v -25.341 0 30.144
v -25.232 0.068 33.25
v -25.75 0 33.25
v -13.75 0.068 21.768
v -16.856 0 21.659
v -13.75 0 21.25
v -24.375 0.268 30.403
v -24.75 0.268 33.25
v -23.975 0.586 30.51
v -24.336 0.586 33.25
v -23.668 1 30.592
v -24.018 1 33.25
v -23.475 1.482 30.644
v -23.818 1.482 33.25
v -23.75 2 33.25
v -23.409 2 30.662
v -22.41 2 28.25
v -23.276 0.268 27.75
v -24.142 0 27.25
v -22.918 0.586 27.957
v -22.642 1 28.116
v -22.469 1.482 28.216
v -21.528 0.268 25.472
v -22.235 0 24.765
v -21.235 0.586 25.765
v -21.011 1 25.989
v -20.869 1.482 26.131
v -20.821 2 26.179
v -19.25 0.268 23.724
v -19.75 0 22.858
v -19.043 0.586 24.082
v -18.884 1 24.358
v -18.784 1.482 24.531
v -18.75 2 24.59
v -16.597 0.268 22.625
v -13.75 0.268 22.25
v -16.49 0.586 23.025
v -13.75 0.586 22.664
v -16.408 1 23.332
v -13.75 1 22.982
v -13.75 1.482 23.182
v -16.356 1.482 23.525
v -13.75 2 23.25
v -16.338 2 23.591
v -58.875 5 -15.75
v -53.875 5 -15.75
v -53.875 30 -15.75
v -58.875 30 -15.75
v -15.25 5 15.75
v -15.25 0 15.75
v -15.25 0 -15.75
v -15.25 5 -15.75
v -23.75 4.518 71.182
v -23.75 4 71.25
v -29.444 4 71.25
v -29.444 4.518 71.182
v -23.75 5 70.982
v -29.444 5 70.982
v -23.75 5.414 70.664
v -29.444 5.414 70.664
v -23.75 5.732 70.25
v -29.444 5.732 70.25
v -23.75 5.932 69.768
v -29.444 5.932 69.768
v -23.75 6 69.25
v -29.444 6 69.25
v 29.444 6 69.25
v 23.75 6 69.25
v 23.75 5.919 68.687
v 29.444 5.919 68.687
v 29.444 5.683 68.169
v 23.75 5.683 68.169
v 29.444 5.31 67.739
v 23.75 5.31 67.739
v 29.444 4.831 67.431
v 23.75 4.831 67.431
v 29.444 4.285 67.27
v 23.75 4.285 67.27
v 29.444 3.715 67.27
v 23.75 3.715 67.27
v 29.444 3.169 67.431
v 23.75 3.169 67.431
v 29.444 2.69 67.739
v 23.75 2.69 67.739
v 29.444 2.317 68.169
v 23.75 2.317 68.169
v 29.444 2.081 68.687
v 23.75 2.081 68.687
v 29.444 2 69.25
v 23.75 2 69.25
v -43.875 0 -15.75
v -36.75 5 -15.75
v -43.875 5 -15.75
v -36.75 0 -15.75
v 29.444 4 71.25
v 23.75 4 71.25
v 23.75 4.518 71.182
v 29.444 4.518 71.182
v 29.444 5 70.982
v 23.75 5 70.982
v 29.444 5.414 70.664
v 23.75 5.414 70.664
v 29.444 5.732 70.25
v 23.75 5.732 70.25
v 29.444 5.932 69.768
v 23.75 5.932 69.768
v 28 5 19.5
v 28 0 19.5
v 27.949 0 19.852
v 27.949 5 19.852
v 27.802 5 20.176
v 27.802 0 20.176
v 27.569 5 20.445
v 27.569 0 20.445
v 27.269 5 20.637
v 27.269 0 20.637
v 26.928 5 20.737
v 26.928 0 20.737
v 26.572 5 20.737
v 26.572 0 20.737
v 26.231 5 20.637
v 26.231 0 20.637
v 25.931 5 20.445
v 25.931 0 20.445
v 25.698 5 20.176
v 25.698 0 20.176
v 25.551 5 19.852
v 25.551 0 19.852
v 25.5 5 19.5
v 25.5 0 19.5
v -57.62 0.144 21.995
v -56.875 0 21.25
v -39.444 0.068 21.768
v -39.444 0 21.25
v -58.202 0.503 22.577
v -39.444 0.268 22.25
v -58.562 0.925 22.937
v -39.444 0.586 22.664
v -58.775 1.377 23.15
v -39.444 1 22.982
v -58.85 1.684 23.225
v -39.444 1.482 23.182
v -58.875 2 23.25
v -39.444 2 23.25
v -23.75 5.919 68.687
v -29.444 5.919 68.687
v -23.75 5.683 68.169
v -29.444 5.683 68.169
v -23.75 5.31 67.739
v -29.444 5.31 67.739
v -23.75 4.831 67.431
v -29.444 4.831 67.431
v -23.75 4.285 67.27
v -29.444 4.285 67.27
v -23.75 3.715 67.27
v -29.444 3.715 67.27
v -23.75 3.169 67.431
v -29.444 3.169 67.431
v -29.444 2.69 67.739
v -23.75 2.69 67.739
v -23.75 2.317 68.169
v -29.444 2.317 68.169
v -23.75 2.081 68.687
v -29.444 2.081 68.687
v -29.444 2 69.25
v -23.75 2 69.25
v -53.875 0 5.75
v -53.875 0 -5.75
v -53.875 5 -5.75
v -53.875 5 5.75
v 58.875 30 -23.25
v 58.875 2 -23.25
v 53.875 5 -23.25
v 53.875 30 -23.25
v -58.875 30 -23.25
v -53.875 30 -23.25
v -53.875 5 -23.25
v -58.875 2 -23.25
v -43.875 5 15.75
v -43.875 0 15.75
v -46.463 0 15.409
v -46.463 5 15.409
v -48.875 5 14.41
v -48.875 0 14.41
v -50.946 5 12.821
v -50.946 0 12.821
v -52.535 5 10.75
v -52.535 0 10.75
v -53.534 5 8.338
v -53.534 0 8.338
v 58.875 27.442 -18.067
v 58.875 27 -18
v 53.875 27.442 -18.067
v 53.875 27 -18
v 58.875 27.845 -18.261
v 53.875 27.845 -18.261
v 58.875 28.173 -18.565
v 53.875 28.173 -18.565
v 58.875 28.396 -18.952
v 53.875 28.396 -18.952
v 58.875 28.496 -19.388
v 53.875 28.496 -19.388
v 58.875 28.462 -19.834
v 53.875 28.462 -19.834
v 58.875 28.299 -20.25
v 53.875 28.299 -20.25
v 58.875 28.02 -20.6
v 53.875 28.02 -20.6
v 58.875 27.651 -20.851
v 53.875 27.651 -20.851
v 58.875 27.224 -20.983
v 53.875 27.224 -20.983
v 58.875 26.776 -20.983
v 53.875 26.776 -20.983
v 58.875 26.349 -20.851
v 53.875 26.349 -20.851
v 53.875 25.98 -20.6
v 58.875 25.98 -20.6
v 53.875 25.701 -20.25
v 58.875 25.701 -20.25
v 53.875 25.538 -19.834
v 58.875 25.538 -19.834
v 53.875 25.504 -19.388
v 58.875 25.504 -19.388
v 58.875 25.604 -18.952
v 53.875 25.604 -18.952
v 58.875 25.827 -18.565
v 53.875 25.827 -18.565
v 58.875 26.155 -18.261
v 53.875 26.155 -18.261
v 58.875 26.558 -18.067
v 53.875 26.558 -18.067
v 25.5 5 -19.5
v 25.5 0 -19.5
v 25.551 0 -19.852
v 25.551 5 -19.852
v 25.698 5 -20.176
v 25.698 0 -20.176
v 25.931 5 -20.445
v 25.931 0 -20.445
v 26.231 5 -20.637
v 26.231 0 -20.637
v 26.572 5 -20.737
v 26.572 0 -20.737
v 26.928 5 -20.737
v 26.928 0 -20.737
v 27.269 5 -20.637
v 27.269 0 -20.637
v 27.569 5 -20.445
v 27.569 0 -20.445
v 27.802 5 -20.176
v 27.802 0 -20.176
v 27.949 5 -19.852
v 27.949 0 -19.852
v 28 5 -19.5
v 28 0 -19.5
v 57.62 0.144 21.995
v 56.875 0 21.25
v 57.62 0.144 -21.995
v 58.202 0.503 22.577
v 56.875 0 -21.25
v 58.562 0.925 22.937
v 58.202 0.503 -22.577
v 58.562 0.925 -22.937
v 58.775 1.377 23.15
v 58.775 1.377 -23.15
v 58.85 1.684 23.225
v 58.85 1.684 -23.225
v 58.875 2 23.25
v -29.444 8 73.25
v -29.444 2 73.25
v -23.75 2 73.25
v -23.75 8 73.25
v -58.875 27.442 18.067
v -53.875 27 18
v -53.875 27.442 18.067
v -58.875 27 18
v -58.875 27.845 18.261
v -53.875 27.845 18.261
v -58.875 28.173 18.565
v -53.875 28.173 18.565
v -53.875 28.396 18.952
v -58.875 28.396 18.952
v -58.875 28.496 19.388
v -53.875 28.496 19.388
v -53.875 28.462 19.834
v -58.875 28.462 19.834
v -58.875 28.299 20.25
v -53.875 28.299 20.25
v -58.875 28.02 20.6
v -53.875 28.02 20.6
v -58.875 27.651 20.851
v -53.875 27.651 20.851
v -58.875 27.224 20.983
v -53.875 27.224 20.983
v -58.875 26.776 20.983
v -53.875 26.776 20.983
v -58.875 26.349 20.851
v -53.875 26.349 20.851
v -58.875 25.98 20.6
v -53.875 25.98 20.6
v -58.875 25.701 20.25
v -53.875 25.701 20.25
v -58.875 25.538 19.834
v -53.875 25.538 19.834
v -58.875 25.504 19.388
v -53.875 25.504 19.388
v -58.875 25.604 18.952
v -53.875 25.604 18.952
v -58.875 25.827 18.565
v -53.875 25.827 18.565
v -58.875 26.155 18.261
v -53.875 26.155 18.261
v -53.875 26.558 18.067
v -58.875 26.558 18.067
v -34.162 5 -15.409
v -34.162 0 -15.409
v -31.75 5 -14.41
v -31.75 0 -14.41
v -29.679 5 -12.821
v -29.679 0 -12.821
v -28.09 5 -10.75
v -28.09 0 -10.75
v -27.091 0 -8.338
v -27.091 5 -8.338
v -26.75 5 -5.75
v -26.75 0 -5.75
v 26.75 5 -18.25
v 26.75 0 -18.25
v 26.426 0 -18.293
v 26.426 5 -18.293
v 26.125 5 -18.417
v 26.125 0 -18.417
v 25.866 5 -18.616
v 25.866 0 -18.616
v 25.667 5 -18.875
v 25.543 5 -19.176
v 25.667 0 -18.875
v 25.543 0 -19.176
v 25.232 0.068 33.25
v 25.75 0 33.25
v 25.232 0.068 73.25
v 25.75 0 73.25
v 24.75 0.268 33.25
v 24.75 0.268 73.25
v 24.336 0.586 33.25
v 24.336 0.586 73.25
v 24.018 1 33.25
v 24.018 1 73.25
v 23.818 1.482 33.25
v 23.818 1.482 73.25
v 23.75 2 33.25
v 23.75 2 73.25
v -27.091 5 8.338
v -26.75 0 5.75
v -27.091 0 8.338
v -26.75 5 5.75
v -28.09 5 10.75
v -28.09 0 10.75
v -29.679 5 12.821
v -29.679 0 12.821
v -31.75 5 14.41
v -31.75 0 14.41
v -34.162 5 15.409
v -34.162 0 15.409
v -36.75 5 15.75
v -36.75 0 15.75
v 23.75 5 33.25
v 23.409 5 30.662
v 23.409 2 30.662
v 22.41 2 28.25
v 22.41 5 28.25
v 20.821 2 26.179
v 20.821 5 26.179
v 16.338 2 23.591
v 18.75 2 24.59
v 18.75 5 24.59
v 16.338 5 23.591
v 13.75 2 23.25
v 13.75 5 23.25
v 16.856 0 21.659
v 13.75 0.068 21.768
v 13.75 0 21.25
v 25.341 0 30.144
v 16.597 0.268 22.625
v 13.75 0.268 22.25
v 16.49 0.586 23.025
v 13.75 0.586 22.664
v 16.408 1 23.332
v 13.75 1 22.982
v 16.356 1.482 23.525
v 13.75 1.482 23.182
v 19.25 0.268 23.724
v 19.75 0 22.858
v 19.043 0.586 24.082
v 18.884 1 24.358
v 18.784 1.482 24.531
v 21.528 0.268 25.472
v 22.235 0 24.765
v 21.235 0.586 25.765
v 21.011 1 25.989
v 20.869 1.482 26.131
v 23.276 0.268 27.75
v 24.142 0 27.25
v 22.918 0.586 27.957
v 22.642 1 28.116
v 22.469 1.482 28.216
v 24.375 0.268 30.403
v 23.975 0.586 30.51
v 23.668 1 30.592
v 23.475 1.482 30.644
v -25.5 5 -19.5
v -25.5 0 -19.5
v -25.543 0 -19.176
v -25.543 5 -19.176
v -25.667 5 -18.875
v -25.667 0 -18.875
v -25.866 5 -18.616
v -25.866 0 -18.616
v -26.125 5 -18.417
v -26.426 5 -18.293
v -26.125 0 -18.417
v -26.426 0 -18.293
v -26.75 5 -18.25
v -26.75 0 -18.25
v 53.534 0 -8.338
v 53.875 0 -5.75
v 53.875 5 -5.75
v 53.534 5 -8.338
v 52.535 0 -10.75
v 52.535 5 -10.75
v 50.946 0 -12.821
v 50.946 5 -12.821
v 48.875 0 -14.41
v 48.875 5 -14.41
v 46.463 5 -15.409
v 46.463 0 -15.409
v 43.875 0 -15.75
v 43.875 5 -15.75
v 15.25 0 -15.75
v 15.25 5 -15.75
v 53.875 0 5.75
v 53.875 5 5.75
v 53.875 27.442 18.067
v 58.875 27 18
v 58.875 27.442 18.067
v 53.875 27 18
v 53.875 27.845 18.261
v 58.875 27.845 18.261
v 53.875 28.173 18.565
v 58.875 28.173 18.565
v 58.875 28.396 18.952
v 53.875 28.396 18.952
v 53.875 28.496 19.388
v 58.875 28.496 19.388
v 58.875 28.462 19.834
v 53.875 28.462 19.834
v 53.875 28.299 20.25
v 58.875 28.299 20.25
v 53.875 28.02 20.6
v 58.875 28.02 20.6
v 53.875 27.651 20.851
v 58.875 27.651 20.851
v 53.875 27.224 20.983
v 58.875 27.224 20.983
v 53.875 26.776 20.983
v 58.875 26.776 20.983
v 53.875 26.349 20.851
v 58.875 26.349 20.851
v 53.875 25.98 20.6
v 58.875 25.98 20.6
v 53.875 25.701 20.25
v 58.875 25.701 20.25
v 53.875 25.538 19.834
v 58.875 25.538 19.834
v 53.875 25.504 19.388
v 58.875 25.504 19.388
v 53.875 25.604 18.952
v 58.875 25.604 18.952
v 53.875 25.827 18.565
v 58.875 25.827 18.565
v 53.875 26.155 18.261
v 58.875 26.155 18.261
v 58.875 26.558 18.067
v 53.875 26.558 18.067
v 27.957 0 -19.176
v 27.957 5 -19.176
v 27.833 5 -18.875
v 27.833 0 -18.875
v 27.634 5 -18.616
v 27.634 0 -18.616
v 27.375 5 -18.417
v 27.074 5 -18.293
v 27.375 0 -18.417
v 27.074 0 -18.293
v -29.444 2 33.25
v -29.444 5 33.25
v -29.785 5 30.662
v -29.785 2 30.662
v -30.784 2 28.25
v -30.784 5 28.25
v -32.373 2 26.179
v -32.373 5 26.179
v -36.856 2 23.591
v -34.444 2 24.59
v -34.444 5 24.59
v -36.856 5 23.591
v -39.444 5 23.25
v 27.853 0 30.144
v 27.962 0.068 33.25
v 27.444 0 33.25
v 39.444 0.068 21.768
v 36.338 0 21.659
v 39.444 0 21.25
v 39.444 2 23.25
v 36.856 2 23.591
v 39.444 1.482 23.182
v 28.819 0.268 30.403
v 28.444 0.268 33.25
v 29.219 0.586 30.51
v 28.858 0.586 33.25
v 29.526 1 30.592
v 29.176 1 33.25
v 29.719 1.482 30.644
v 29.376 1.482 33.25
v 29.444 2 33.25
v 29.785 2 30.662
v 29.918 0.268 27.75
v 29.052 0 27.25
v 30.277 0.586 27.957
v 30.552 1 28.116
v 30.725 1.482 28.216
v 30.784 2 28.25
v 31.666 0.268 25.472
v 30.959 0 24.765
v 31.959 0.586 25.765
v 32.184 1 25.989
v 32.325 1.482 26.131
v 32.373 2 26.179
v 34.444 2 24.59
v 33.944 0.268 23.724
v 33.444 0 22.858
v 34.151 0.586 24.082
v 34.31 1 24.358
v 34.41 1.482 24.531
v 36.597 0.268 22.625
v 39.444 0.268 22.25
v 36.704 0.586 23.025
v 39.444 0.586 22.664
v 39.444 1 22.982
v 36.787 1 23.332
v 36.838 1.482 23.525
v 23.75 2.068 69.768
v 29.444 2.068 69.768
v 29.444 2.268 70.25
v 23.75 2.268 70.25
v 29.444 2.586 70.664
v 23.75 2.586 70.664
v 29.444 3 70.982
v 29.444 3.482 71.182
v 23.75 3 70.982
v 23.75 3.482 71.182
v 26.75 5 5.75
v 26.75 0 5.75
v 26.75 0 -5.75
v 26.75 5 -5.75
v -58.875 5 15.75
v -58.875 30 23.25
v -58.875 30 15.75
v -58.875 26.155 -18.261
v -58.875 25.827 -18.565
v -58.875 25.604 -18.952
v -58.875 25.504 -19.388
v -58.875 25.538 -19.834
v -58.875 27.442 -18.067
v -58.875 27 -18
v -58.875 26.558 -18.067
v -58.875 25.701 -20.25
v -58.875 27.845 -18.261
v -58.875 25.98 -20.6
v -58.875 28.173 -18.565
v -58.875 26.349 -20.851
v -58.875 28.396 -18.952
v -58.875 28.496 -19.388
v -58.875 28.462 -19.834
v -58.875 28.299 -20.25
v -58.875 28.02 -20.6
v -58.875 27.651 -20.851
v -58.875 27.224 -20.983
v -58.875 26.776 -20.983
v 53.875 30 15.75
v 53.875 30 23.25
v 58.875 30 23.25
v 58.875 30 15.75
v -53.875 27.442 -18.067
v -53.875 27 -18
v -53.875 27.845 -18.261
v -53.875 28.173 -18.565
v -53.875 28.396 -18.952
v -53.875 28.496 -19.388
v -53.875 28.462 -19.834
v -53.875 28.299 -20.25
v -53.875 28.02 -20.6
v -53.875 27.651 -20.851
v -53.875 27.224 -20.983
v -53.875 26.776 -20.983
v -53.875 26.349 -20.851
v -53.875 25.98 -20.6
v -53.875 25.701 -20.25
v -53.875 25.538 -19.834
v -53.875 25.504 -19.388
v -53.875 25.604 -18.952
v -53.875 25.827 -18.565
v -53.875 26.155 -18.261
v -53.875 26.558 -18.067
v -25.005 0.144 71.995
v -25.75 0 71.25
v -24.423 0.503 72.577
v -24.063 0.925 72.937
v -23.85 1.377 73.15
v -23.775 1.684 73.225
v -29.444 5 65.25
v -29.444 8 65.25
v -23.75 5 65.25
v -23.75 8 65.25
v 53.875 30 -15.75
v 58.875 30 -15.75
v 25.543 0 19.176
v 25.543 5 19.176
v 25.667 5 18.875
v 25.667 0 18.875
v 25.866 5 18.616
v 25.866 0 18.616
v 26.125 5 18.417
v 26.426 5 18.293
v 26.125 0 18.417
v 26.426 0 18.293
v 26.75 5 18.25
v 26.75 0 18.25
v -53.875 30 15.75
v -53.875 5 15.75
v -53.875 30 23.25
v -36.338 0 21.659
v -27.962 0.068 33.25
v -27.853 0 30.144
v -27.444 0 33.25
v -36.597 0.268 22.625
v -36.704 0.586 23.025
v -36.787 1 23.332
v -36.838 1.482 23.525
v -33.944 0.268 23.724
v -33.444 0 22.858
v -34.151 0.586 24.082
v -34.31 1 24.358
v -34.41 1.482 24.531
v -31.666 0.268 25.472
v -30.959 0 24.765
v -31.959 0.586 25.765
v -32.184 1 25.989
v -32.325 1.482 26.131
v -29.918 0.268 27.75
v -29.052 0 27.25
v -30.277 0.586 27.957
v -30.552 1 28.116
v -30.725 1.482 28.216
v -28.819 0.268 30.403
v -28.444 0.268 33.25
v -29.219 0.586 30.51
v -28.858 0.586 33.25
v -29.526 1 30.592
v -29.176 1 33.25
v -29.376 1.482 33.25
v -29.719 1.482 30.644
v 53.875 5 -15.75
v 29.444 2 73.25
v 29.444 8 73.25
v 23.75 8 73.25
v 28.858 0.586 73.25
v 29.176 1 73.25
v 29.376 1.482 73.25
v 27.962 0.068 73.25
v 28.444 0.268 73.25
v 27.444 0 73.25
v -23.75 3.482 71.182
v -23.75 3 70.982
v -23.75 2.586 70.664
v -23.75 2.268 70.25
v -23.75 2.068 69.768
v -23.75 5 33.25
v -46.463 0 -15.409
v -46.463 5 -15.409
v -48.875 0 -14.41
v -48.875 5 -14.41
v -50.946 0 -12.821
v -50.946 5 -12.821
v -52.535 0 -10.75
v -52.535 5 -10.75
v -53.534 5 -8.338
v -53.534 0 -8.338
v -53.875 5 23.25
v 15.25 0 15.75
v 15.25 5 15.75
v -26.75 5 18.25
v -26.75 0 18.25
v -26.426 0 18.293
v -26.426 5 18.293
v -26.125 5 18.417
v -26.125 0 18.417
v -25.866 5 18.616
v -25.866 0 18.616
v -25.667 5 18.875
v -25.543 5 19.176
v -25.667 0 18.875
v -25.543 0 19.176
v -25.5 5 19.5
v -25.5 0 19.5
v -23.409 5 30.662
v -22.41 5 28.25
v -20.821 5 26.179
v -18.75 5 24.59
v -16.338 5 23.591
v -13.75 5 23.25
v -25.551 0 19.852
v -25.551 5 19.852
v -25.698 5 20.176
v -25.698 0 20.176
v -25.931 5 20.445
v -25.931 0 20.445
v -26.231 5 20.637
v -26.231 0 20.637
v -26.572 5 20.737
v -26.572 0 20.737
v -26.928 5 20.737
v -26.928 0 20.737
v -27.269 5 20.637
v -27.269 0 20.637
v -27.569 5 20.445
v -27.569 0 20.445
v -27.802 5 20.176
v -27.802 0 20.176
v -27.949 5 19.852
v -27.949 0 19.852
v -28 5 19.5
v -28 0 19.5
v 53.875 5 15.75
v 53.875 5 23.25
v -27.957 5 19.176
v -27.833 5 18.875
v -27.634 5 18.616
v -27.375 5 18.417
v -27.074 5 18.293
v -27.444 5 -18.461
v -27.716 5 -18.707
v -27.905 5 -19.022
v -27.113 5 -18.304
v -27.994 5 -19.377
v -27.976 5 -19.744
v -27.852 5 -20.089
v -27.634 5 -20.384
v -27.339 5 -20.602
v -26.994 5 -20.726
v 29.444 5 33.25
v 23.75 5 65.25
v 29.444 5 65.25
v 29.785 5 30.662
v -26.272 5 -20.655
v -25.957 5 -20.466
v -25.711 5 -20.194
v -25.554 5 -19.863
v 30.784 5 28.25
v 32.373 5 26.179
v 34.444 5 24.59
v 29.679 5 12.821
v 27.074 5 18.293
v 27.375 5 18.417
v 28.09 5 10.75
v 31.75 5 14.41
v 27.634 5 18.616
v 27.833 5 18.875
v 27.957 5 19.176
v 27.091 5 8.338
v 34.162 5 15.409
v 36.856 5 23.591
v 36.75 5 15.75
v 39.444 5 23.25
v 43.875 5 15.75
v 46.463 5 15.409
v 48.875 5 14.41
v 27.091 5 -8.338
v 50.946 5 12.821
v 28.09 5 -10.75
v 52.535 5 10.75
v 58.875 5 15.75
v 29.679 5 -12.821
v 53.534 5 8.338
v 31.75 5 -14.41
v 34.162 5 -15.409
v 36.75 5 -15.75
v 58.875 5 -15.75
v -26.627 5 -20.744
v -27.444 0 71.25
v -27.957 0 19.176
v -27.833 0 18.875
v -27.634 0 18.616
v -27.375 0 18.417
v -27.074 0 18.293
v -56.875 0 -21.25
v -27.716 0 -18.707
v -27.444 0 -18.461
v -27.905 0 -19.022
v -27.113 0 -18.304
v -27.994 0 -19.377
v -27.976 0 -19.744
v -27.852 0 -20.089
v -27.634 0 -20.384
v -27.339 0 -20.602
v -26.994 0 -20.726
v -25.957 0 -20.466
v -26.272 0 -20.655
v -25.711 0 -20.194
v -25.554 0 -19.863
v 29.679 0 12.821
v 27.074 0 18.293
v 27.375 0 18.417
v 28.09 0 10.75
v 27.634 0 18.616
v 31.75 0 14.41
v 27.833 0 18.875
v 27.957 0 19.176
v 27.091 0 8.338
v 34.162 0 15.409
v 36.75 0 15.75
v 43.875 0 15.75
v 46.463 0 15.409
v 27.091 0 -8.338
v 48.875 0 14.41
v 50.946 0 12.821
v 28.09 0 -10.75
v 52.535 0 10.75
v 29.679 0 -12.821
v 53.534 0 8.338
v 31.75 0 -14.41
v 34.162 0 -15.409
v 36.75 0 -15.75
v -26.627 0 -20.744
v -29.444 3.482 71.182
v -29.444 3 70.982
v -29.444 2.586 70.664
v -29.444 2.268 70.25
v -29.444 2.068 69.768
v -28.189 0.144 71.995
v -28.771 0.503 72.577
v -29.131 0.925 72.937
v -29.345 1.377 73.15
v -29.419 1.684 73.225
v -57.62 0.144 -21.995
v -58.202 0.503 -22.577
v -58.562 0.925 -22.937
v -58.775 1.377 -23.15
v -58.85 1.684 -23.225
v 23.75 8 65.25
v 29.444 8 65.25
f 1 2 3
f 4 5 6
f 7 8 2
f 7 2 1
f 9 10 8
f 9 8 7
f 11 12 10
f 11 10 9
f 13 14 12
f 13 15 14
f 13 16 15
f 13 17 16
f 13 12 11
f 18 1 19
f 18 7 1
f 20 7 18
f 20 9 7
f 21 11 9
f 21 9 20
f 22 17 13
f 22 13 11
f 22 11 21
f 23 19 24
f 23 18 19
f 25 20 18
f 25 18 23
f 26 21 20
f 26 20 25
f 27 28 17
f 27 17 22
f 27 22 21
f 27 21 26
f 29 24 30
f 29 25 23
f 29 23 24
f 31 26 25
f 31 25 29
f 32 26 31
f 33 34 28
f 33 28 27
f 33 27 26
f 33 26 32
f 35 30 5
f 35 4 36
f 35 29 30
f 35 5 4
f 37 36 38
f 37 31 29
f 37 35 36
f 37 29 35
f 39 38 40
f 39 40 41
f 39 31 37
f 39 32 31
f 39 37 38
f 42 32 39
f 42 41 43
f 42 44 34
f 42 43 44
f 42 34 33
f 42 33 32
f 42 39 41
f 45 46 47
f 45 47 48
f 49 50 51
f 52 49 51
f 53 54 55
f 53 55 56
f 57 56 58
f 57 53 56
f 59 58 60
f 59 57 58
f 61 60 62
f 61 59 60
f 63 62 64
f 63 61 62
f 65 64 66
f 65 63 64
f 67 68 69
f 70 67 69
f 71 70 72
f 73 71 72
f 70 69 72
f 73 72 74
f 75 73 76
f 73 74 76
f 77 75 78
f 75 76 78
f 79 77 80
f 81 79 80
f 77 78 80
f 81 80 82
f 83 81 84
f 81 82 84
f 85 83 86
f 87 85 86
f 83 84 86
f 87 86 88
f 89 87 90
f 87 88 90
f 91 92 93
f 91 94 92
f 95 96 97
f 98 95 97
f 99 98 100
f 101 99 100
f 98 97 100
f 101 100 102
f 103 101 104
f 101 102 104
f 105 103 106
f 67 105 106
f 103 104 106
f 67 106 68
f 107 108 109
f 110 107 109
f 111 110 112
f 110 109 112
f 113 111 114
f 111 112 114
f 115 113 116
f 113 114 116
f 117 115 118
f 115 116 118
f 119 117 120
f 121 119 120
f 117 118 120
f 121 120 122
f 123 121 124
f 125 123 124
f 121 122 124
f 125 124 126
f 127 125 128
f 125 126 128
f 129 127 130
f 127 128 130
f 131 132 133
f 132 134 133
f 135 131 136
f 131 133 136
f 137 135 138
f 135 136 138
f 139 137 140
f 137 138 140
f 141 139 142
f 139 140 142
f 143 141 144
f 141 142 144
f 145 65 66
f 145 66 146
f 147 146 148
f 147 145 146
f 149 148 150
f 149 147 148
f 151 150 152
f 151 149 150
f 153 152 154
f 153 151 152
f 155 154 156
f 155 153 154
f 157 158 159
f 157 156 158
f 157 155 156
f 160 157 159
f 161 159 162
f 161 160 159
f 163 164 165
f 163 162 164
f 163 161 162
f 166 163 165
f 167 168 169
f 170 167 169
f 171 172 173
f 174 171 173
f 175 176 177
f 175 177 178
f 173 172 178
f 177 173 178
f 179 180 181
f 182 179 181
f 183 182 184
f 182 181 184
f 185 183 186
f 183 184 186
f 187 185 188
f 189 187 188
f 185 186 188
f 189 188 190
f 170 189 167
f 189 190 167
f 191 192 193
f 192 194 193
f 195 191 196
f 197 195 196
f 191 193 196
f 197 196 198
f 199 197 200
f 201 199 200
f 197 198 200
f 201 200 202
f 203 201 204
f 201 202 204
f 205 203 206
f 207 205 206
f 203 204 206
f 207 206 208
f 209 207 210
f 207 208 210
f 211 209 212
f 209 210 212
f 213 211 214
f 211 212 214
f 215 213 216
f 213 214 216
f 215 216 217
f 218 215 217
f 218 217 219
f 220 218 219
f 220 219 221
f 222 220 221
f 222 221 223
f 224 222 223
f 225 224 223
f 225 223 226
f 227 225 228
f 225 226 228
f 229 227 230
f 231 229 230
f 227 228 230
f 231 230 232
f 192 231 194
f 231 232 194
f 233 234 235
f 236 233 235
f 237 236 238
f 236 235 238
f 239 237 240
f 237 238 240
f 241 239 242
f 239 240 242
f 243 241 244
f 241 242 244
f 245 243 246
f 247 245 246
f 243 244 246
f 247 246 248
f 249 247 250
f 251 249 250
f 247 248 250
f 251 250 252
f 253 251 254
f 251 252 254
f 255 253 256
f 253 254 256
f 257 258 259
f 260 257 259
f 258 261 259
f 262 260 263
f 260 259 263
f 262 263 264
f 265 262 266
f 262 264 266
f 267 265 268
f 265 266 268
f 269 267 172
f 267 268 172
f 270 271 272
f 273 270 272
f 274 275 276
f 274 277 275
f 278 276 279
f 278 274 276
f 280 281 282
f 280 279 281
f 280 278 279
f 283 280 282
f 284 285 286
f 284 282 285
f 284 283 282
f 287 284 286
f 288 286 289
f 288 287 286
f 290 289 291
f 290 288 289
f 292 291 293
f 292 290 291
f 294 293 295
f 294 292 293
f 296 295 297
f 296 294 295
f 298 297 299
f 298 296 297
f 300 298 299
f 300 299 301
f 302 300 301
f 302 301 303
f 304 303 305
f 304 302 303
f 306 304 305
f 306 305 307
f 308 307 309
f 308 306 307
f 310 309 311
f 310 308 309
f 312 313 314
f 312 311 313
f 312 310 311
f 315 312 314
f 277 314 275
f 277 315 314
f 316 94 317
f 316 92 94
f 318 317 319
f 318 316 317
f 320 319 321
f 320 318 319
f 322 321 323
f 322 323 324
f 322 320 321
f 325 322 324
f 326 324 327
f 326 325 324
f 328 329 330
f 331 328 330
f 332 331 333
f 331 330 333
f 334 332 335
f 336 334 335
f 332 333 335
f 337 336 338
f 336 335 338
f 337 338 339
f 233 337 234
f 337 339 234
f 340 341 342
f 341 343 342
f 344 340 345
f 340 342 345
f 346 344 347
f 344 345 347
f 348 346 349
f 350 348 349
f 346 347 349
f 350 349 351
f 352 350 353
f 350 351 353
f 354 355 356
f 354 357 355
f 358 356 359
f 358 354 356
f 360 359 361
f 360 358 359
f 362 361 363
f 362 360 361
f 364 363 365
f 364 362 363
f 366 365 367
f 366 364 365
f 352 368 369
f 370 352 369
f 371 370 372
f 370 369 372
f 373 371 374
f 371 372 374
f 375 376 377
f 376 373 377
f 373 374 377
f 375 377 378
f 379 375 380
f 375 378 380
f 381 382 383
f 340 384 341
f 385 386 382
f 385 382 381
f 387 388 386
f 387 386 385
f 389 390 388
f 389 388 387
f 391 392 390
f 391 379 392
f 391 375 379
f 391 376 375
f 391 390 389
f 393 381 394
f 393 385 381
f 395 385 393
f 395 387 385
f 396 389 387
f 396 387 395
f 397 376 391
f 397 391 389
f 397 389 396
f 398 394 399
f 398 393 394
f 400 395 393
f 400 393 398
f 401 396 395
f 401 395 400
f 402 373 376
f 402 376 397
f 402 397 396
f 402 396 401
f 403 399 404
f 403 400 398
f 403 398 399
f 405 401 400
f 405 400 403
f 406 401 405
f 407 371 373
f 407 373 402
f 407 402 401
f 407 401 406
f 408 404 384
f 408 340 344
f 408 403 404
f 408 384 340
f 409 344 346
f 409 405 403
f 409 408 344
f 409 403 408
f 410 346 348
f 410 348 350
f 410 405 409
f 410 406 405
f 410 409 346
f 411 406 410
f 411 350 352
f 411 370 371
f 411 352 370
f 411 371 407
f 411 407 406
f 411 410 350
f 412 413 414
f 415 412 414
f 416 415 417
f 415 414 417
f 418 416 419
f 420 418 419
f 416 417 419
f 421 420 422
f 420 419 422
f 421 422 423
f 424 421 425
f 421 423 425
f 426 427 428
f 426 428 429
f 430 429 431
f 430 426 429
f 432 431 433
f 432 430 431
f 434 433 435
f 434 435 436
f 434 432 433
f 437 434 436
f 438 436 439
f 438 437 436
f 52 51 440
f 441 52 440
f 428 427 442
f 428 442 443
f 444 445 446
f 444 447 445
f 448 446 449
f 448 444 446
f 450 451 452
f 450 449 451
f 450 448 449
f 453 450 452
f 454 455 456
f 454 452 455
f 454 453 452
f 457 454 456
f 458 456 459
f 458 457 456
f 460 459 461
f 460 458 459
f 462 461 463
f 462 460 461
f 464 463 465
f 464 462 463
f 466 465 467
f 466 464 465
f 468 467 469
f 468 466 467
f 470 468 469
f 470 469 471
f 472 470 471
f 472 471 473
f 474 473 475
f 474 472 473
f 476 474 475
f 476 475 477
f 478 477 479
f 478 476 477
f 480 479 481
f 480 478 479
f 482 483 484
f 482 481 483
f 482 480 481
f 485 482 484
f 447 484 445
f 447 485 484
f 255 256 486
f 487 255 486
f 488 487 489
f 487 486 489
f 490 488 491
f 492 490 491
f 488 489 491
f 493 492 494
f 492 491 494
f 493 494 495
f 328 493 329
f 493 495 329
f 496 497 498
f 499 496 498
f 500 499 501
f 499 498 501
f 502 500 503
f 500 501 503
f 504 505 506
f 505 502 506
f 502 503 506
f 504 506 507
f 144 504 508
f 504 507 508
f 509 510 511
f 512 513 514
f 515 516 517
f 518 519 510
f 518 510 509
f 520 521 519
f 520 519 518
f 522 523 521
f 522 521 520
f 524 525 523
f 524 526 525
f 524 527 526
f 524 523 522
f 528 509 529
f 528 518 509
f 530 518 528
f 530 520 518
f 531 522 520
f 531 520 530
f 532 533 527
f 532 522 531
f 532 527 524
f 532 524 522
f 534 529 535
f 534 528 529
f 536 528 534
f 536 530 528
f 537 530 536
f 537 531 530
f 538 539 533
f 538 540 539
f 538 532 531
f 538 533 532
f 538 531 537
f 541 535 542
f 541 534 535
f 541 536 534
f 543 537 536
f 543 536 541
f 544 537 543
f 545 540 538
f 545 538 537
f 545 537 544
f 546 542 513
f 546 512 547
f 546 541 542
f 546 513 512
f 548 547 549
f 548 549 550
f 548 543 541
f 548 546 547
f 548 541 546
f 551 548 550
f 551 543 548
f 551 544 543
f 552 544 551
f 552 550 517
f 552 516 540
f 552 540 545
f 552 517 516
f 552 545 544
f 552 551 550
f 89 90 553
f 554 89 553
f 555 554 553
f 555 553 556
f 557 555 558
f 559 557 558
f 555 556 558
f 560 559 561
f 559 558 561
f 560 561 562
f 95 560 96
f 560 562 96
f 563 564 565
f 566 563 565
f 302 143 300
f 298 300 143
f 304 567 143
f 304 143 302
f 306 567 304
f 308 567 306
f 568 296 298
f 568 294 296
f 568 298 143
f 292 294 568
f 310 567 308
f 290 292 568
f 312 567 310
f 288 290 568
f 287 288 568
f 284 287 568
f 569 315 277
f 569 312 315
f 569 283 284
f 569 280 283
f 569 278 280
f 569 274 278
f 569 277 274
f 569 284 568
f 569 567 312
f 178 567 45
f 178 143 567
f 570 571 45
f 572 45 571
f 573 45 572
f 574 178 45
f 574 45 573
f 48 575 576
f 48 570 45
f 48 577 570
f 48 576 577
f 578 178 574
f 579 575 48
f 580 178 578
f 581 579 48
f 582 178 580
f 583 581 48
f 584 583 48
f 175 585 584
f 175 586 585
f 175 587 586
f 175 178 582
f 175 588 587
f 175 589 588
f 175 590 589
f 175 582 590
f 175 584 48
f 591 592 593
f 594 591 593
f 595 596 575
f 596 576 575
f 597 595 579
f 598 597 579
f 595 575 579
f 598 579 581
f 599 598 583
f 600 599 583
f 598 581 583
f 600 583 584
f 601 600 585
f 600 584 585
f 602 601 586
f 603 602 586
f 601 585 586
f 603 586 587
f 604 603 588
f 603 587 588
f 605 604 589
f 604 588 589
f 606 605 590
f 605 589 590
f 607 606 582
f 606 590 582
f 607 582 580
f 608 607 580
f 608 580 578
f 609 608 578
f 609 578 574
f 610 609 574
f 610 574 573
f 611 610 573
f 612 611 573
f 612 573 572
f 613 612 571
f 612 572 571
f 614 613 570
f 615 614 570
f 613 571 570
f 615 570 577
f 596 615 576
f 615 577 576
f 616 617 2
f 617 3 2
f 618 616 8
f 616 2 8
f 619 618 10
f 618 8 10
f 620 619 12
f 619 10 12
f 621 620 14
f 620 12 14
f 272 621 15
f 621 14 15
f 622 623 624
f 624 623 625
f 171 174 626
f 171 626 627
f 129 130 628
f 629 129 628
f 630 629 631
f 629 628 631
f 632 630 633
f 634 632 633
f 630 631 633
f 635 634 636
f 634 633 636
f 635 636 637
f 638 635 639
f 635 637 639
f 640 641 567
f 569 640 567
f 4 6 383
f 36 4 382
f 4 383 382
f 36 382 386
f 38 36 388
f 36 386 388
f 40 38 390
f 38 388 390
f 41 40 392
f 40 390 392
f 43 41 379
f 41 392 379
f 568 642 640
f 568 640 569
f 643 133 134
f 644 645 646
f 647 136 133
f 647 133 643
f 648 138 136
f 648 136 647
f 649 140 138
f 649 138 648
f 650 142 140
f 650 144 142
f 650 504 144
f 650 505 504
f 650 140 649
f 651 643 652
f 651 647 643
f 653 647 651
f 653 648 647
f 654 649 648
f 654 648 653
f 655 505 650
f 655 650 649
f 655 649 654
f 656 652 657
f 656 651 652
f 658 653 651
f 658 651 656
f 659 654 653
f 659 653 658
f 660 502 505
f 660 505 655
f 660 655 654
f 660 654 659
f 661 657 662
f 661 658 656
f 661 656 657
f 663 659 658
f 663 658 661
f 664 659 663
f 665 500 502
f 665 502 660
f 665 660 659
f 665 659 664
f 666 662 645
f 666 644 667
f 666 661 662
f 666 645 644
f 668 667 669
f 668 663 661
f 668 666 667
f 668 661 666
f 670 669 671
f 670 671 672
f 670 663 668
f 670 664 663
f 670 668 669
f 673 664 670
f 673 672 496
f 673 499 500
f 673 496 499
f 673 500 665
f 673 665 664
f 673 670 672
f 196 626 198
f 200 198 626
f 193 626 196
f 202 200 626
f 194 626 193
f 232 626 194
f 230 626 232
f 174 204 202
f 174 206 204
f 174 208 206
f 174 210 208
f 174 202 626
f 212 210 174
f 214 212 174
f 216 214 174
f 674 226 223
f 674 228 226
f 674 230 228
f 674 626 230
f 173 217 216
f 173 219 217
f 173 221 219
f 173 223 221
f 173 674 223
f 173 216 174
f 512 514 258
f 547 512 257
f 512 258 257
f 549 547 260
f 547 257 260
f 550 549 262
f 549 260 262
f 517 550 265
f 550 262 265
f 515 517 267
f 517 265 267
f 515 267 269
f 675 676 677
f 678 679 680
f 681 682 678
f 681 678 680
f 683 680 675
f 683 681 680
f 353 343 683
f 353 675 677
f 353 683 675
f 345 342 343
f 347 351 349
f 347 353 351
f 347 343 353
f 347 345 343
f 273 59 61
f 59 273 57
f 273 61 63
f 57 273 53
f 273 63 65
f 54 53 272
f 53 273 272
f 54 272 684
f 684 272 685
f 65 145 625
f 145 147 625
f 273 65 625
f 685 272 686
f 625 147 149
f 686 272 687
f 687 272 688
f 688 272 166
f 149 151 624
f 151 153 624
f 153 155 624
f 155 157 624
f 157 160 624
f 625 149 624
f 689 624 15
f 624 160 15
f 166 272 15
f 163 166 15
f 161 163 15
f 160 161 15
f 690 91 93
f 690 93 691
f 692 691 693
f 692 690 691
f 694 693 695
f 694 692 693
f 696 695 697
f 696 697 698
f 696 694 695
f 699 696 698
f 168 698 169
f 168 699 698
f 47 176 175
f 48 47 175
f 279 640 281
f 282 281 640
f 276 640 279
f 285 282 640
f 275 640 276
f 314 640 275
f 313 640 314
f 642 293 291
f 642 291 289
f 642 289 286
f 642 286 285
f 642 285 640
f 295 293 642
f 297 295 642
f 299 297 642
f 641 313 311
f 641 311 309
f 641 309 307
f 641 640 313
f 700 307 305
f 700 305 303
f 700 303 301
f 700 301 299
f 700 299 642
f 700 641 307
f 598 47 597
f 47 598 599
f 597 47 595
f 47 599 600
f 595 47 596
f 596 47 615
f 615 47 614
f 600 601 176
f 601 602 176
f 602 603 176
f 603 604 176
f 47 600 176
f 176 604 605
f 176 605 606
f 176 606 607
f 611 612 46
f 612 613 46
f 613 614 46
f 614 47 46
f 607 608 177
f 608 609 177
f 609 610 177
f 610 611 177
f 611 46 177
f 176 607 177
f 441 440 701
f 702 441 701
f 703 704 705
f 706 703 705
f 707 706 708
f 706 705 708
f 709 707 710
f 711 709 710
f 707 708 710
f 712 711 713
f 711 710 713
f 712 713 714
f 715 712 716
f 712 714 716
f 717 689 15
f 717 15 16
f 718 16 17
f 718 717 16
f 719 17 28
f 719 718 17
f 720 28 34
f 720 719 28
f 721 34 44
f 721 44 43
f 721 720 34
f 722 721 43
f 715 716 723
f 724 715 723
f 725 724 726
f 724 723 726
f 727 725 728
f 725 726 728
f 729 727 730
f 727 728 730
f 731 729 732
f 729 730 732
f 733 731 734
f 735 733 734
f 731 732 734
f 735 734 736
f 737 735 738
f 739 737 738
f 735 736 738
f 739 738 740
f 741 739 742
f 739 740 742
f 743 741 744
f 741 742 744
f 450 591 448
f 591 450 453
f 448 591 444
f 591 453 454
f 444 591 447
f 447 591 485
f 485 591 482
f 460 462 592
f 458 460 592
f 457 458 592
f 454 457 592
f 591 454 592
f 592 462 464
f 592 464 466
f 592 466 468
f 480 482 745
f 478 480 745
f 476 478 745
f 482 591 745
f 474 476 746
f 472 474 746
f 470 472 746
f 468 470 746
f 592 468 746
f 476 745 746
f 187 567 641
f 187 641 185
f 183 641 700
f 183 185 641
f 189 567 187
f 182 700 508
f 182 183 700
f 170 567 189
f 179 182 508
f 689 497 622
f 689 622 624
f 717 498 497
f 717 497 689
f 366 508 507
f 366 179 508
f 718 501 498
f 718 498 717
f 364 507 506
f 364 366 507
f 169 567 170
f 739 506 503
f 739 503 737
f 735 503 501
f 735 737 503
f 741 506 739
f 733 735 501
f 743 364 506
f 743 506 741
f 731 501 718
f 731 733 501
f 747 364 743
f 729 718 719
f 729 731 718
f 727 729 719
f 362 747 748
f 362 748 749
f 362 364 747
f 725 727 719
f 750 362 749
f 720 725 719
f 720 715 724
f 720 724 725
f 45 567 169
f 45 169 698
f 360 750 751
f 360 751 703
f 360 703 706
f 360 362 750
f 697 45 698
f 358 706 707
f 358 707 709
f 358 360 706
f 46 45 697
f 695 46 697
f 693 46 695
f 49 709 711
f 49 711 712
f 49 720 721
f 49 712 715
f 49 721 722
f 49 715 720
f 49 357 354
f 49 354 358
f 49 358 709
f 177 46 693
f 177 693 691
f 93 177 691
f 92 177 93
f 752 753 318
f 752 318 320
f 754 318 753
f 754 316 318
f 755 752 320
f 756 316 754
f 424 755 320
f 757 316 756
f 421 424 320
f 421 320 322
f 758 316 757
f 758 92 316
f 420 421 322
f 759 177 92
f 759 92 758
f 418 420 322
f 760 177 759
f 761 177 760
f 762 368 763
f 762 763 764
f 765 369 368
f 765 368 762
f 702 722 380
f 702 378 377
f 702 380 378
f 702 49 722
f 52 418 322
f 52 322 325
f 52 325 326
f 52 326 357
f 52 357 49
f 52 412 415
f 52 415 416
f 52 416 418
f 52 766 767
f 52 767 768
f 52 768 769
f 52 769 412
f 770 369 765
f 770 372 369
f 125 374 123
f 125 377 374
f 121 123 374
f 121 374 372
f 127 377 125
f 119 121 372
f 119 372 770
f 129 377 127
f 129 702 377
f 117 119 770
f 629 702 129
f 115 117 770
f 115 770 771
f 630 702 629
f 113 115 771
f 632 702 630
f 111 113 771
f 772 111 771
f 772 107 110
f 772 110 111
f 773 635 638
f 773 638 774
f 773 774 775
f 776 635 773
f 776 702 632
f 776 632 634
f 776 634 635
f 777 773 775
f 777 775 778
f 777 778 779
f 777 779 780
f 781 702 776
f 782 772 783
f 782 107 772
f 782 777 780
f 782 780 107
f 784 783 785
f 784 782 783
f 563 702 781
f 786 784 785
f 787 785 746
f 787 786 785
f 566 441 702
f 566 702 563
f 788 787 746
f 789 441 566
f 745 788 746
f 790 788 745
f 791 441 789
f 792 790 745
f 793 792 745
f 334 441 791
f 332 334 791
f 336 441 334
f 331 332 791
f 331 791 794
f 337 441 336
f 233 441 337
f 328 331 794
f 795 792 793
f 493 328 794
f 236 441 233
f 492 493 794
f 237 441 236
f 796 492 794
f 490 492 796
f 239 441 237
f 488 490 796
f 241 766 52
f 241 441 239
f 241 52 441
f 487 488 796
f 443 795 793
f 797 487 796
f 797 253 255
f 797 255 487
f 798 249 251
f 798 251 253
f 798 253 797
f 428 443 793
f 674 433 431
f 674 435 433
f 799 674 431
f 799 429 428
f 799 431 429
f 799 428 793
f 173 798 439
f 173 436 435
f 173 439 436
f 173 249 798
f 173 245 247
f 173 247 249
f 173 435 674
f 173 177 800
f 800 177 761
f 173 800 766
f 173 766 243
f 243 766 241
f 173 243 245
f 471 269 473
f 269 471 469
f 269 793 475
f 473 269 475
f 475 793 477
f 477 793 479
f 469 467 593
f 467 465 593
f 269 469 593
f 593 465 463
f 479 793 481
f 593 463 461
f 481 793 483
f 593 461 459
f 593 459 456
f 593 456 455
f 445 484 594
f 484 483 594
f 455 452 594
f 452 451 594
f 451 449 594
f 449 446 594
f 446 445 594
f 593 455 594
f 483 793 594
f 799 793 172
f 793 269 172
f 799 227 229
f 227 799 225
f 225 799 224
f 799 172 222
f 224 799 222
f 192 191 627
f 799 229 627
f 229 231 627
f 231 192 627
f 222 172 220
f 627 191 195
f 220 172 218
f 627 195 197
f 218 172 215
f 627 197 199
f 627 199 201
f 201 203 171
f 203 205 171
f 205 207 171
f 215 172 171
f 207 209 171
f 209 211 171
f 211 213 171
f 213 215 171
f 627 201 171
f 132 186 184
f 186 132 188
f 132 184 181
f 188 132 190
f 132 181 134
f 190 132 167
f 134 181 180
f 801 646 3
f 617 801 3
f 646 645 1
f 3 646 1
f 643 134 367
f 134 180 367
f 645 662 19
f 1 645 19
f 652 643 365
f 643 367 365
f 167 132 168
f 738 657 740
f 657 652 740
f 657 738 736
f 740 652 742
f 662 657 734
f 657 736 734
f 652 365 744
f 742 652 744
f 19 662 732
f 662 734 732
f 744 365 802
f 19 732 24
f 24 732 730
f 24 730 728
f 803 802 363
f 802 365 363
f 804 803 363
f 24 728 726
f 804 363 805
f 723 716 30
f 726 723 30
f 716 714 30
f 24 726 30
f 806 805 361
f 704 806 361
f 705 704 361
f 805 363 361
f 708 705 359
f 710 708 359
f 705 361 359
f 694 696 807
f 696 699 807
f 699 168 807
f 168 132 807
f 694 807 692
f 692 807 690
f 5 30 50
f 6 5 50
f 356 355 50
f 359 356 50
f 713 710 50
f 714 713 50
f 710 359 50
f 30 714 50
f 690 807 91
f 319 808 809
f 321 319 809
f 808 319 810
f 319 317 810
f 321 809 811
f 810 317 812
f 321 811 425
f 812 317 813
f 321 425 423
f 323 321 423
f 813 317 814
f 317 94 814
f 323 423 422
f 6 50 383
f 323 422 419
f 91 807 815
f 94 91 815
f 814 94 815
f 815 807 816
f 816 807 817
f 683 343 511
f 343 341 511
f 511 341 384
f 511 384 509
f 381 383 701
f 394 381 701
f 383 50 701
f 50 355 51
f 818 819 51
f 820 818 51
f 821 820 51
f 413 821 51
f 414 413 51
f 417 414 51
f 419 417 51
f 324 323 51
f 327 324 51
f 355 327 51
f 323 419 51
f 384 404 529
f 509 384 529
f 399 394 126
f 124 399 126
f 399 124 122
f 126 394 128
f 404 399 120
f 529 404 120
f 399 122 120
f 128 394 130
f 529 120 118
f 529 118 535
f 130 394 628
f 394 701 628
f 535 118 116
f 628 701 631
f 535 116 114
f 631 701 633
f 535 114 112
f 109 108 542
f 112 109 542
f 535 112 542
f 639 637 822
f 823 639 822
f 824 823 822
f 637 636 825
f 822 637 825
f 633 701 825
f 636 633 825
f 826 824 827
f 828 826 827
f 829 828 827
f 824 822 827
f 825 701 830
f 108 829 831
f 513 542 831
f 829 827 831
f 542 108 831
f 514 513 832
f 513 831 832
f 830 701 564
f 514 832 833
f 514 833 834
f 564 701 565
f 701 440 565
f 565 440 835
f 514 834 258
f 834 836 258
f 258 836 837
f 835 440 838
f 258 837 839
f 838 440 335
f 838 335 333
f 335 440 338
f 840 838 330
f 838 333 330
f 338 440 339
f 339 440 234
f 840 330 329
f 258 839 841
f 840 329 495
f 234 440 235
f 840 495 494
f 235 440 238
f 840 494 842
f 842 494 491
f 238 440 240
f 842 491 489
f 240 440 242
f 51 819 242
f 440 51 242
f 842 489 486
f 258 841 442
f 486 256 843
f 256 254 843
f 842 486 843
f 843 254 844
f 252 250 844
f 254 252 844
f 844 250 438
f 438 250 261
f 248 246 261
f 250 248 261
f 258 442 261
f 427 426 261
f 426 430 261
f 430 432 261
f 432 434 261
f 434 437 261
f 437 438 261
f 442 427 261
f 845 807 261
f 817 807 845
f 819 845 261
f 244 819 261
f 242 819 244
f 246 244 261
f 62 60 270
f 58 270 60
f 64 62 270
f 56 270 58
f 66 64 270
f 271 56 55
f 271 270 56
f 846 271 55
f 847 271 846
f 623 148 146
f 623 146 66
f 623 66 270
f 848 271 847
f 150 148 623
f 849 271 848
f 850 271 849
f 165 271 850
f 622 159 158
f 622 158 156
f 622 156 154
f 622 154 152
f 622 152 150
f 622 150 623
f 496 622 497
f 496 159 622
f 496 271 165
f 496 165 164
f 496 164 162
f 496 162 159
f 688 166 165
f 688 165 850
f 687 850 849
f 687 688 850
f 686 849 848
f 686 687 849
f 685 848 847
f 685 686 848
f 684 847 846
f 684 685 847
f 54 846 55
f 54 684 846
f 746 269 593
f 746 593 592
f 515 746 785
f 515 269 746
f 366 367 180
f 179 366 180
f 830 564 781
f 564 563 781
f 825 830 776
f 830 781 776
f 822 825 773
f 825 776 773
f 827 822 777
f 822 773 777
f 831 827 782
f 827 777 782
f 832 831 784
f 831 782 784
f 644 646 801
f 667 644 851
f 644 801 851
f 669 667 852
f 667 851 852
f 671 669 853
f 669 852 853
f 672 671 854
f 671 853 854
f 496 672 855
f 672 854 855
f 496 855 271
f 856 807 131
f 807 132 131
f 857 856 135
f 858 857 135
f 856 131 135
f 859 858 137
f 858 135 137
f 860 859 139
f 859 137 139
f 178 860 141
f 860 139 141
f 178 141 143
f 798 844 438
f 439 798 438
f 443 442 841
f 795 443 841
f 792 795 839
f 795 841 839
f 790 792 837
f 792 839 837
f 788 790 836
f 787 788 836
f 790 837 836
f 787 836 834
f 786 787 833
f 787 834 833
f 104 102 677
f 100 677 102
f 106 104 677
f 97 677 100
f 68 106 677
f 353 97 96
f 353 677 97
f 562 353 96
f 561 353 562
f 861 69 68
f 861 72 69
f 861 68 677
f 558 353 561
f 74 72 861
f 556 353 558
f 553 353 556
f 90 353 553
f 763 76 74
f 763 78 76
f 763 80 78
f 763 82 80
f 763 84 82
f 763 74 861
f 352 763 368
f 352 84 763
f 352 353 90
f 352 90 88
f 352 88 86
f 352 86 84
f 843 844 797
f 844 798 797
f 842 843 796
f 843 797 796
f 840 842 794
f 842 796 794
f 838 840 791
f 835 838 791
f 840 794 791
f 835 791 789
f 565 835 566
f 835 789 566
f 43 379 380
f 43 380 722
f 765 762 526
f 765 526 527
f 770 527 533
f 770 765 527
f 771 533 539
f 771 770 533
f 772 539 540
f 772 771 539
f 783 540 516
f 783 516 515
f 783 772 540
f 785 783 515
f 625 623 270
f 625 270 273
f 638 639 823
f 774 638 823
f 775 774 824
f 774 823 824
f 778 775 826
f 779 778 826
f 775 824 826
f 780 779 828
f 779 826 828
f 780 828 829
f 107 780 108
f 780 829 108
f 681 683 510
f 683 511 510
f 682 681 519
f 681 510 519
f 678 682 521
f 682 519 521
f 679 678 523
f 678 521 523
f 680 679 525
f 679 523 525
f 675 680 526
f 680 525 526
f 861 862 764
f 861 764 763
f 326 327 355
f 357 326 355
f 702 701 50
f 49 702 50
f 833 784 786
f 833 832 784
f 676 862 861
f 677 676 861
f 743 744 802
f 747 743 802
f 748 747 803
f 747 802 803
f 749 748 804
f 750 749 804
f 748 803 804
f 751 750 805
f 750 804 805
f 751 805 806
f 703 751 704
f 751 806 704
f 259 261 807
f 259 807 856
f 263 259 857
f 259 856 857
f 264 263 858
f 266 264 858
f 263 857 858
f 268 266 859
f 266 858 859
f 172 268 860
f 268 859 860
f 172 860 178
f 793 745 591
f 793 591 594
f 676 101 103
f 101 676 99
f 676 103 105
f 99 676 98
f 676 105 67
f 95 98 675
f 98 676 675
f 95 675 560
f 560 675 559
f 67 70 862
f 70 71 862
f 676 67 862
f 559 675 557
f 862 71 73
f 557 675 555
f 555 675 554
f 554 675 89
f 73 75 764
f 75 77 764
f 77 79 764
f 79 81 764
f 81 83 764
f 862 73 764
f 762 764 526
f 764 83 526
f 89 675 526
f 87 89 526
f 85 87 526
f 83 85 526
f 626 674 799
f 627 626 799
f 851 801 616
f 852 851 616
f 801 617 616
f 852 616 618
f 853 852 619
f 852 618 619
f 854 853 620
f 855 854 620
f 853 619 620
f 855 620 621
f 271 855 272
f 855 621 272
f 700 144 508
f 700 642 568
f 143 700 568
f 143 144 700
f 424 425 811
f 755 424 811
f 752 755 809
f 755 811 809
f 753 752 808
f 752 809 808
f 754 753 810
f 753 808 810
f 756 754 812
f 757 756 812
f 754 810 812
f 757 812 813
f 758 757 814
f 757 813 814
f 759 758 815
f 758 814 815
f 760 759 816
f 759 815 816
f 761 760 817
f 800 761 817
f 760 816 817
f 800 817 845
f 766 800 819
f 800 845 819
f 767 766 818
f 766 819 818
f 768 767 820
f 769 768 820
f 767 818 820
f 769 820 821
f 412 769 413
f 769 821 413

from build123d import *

# Parameters (mm, degrees)
BOSS_EXTRUDE1_DEPTH     = 5
FILLET1_R               = 10
FILLET2_R               = 10
FILLET3_R               = 10
FILLET4_R               = 10
SKETCH2_W               = 5
SKETCH2_H               = 7.5
BOSS_EXTRUDE2_DEPTH     = 25
MIRROR2_COPY_1_SKETCH_W = 5
MIRROR2_COPY_1_SKETCH_H = 7.5
MIRROR2_COPY_1_DEPTH    = 25
SKETCH3_R               = 1.5
CUT_EXTRUDE1_DEPTH      = 119.966907163
SKETCH4_W               = 2.694155106
SKETCH4_H               = 50
SKETCH4_W_2             = 3
BOSS_EXTRUDE3_DEPTH     = 8
SKETCH5_W               = 5.694155106
SKETCH5_H               = 3
CUT_EXTRUDE2_DEPTH      = 42
CUT_EXTRUDE3_DEPTH      = 115.422257996
FILLET5_R               = 10
FILLET6_R               = 10
FILLET7_R               = 10
FILLET8_R               = 10
BOSS_EXTRUDE4_REACH     = 112.848
SKETCH7_W               = 5
SKETCH7_H               = 5
FILLET9_R               = 10
FILLET10_DEPTH          = 5
FILLET11_R              = 10
FILLET12_DEPTH          = 5
FILLET13_R              = 2


with BuildPart() as part:
    # Sketch1 → Boss-Extrude1 (new body)
    with BuildSketch(Plane(origin=(0, 0, 0), x_dir=(1, 0, 0), z_dir=(0, 1, 0))):
        with BuildLine():
            Line((-34.25, 15.75), (-26.75, 15.75))
            Line((-26.75, 15.75), (-26.75, 18.25))
            ThreePointArc((-26.75, 18.25), (-27.633883476, 20.383883476), (-25.5, 19.5))
            Line((-25.5, 19.5), (25.5, 19.5))
            ThreePointArc((25.5, 19.5), (26.75, 20.75), (28, 19.5))
            ThreePointArc((28, 19.5), (27.633883476, 18.616116524), (26.75, 18.25))
            Line((26.75, 18.25), (26.75, 15.75))
            Line((26.75, 15.75), (34.25, 15.75))
            Line((34.25, 15.75), (58.875, 15.75))
            Line((58.875, 15.75), (58.875, 23.25))
            Line((58.875, 23.25), (-58.875, 23.25))
            Line((-58.875, 23.25), (-58.875, 15.75))
            Line((-58.875, 15.75), (-34.25, 15.75))
        make_face()
        with BuildLine():
            Line((-26.75, 18.25), (-26.75, 15.75))
            Line((-26.75, 15.75), (-15.25, 15.75))
            Line((-15.25, 15.75), (15.25, 15.75))
            Line((15.25, 15.75), (26.75, 15.75))
            Line((26.75, 15.75), (26.75, 18.25))
            ThreePointArc((26.75, 18.25), (25.866116524, 18.616116524), (25.5, 19.5))
            Line((25.5, 19.5), (-25.5, 19.5))
            ThreePointArc((-25.5, 19.5), (-25.866116524, 18.616116524), (-26.75, 18.25))
        make_face()
        with BuildLine():
            Line((0, -19.5), (-25.5, -19.5))
            ThreePointArc((-25.5, -19.5), (-26.75, -20.75), (-28, -19.5))
            Line((-28, -19.5), (-58.875, -19.5))
            Line((-58.875, -19.5), (-58.875, -23.25))
            Line((-58.875, -23.25), (58.875, -23.25))
            Line((58.875, -23.25), (58.875, -15.75))
            Line((58.875, -15.75), (34.25, -15.75))
            Line((34.25, -15.75), (26.75, -15.75))
            Line((26.75, -15.75), (26.75, -18.25))
            ThreePointArc((26.75, -18.25), (27.633883476, -18.616116524), (28, -19.5))
            ThreePointArc((28, -19.5), (26.75, -20.75), (25.5, -19.5))
            Line((25.5, -19.5), (0, -19.5))
        make_face()
        with BuildLine():
            Line((-26.75, -15.75), (-26.75, -18.25))
            ThreePointArc((-26.75, -18.25), (-25.866116524, -18.616116524), (-25.5, -19.5))
            Line((-25.5, -19.5), (0, -19.5))
            Line((0, -19.5), (25.5, -19.5))
            ThreePointArc((25.5, -19.5), (25.866116524, -18.616116524), (26.75, -18.25))
            Line((26.75, -18.25), (26.75, -15.75))
            Line((26.75, -15.75), (15.25, -15.75))
            Line((15.25, -15.75), (-15.25, -15.75))
            Line((-15.25, -15.75), (-26.75, -15.75))
        make_face()
        with BuildLine():
            ThreePointArc((-28, -19.5), (-27.633883476, -18.616116524), (-26.75, -18.25))
            Line((-26.75, -18.25), (-26.75, -15.75))
            Line((-26.75, -15.75), (-34.25, -15.75))
            Line((-34.25, -15.75), (-58.875, -15.75))
            Line((-58.875, -15.75), (-58.875, -19.5))
            Line((-58.875, -19.5), (-28, -19.5))
        make_face()
        Polygon((-26.75, 0), (-26.75, -15.75), (-15.25, -15.75), (-15.25, 0), (-15.25, 15.75), (-26.75, 15.75), align=None)
        Polygon((15.25, 0), (15.25, -15.75), (26.75, -15.75), (26.75, 15.75), (15.25, 15.75), align=None)
    extrude(amount=BOSS_EXTRUDE1_DEPTH)

    # Fillet1
    fillet1_edges = [part.edges().sort_by_distance(p)[0] for p in [
        (-26.75, 2.5, -15.75),
    ]]
    fillet(fillet1_edges, radius=FILLET1_R)

    # Fillet2
    fillet2_edges = [part.edges().sort_by_distance(p)[0] for p in [
        (-26.75, 2.5, 15.75),
    ]]
    fillet(fillet2_edges, radius=FILLET2_R)

    # Fillet3
    fillet3_edges = [part.edges().sort_by_distance(p)[0] for p in [
        (26.75, 2.5, -15.75),
    ]]
    fillet(fillet3_edges, radius=FILLET3_R)

    # Fillet4
    fillet4_edges = [part.edges().sort_by_distance(p)[0] for p in [
        (26.75, 2.5, 15.75),
    ]]
    fillet(fillet4_edges, radius=FILLET4_R)

    # Sketch2 → Boss-Extrude2 (add)
    with BuildSketch(Plane(origin=(0, 5, 0), x_dir=(1, 0, 0), z_dir=(0, 1, 0))):
        with Locations((56.375, 19.5)):
            Rectangle(SKETCH2_W, SKETCH2_H)
    boss_extrude2 = extrude(amount=BOSS_EXTRUDE2_DEPTH)

    # Mirror1: Boss-Extrude2 across plane
    add(boss_extrude2.mirror(Plane(origin=(0, 0, 0), x_dir=(0, 0, 1), z_dir=(1, 0, 0))))

    # Mirror2: Boss-Extrude2 across plane
    add(boss_extrude2.mirror(Plane.XY))

    # Mirror2 copy 1 sketch → Mirror2 copy 1 (add)
    with BuildSketch(Plane(origin=(0, 5, 0), x_dir=(-1, 0, 0), z_dir=(0, 1, 0))):
        with Locations((56.375, 19.5)):
            Rectangle(MIRROR2_COPY_1_SKETCH_W, MIRROR2_COPY_1_SKETCH_H)
    extrude(amount=MIRROR2_COPY_1_DEPTH)

    # Sketch3 → Cut-Extrude1 (cut, symmetric)
    with BuildSketch(Plane.ZY.offset(-53.875)):
        with Locations((-19.5, 27)):
            Circle(SKETCH3_R)
    cut_extrude1 = extrude(amount=CUT_EXTRUDE1_DEPTH, both=True, mode=Mode.SUBTRACT)

    # Mirror3: Cut-Extrude1 across plane
    add(cut_extrude1.mirror(Plane.XY), mode=Mode.SUBTRACT)

    # Sketch4 → Boss-Extrude3 (add)
    with BuildSketch(Plane(origin=(0, 0, 0), x_dir=(-1, 0, 0), z_dir=(0, -1, 0))):
        with Locations((-28.097077553, -48.25)):
            Rectangle(SKETCH4_W, SKETCH4_H)
        with Locations((-25.25, -48.25)):
            Rectangle(SKETCH4_W_2, SKETCH4_H)
    boss_extrude3 = extrude(amount=-BOSS_EXTRUDE3_DEPTH)

    # Sketch5 → Cut-Extrude2 (cut)
    with BuildSketch(Plane(origin=(0, 0, 23.25), x_dir=(-1, 0, 0), z_dir=(0, 0, -1))):
        with Locations((-26.597077553, 6.5)):
            Rectangle(SKETCH5_W, SKETCH5_H)
    cut_extrude2 = extrude(amount=-CUT_EXTRUDE2_DEPTH, mode=Mode.SUBTRACT)

    # Sketch6 → Cut-Extrude3 (cut, through all)
    with BuildSketch(Plane.ZY.offset(-23.75)):
        with BuildLine():
            ThreePointArc((71.25, 4), (70.664213562, 5.414213562), (69.25, 6))
            Line((69.25, 6), (69.25, 2))
            ThreePointArc((69.25, 2), (70.664213562, 2.585786438), (71.25, 4))
        make_face()
        with BuildLine():
            Line((69.25, 2), (69.25, 6))
            ThreePointArc((69.25, 6), (67.25, 4), (69.25, 2))
        make_face()
    cut_extrude3 = extrude(amount=-CUT_EXTRUDE3_DEPTH, mode=Mode.SUBTRACT)

    # Fillet5
    fillet5_edges = [part.edges().sort_by_distance(p)[0] for p in [
        (23.75, 2.5, 23.25),
    ]]
    fillet(fillet5_edges, radius=FILLET5_R)

    # Fillet6
    fillet6_edges = [part.edges().sort_by_distance(p)[0] for p in [
        (29.444155106, 2.5, 23.25),
    ]]
    fillet(fillet6_edges, radius=FILLET6_R)

    # Mirror4: Boss-Extrude3, Cut-Extrude2, Cut-Extrude3 across plane
    add(boss_extrude3.mirror(Plane(origin=(0, 0, 0), x_dir=(0, 0, 1), z_dir=(1, 0, 0))))
    add(cut_extrude2.mirror(Plane(origin=(0, 0, 0), x_dir=(0, 0, 1), z_dir=(1, 0, 0))), mode=Mode.SUBTRACT)
    add(cut_extrude3.mirror(Plane(origin=(0, 0, 0), x_dir=(0, 0, 1), z_dir=(1, 0, 0))), mode=Mode.SUBTRACT)

    # Fillet7
    fillet7_edges = [part.edges().sort_by_distance(p)[0] for p in [
        (-23.75, 2.5, 23.25),
    ]]
    fillet(fillet7_edges, radius=FILLET7_R)

    # Fillet8
    fillet8_edges = [part.edges().sort_by_distance(p)[0] for p in [
        (-29.444155106, 2.5, 23.25),
    ]]
    fillet(fillet8_edges, radius=FILLET8_R)

    # Sketch7 → Boss-Extrude4 (add, up to next)
    with BuildSketch(Plane.XY.offset(-15.75), mode=Mode.PRIVATE) as boss_extrude4_sk1:
        with Locations((-56.375, 2.5)):
            Rectangle(SKETCH7_W, SKETCH7_H)
    boss_extrude4_tool1 = extrude(boss_extrude4_sk1.sketch, amount=BOSS_EXTRUDE4_REACH, mode=Mode.PRIVATE) - part.part
    boss_extrude4 = boss_extrude4_tool1.solids().sort_by_distance((-56.375, 2.5, -15.75))[0]
    add(boss_extrude4)

    # Mirror5: Boss-Extrude4 across plane
    add(boss_extrude4.mirror(Plane(origin=(0, 0, 0), x_dir=(0, 0, 1), z_dir=(1, 0, 0))))

    # Fillet9
    # the kernel refuses this fillet: 10 mm, written as the material it adds along each edge
    with BuildSketch(Plane(origin=(53.875, 0, -15.75), x_dir=(0, 0, 1), z_dir=(0, 1, 0))) as fillet9_piece_1:
        with BuildLine():
            CenterArc((FILLET9_R, -FILLET9_R), FILLET9_R, 90, 90)
            Line((0, -FILLET9_R), (0, 0))
            Line((0, 0), (FILLET9_R, 0))
        make_face()
    extrude(amount=5)

    # Fillet10: read off the stored shape, not the designer's step
    # Fillet10 outline → Fillet10 (add)
    with BuildSketch(Plane(origin=(0, 0, 0), x_dir=(1, 0, 0), z_dir=(0, 1, 0))):
        with BuildLine():
            ThreePointArc((53.875, -5.75), (50.946067812, -12.821067812), (43.875, -15.75))
            Line((43.875, -15.75), (53.875, -15.75))
            Line((53.875, -15.75), (53.875, -5.75))
        make_face()
    extrude(amount=FILLET10_DEPTH)

    # Fillet11
    # the kernel refuses this fillet: 10 mm, written as the material it adds along each edge
    with BuildSketch(Plane(origin=(-53.875, 0, -15.75), x_dir=(1, 0, 0), z_dir=(0, 1, 0))) as fillet11_piece_1:
        with BuildLine():
            CenterArc((FILLET11_R, -FILLET11_R), FILLET11_R, 90, 90)
            Line((0, -FILLET11_R), (0, 0))
            Line((0, 0), (FILLET11_R, 0))
        make_face()
    extrude(amount=5)

    # Fillet12: read off the stored shape, not the designer's step
    # Fillet12 outline → Fillet12 (add)
    with BuildSketch(Plane(origin=(0, 0, 0), x_dir=(1, 0, 0), z_dir=(0, 1, 0))):
        with BuildLine():
            Line((-53.875, -15.75), (-43.875, -15.75))
            ThreePointArc((-43.875, -15.75), (-50.946067812, -12.821067812), (-53.875, -5.75))
            Line((-53.875, -5.75), (-53.875, -15.75))
        make_face()
    extrude(amount=FILLET12_DEPTH)

    # Fillet13
    fillet13_edges = [part.edges().sort_by_distance(p)[0] for p in [
        (0, 0, 23.25),
        (23.75, 0, 53.25),
        (20.821067812, 0, 26.178932188),
        (29.444155106, 0, 53.25),
        (32.373087294, 0, 26.178932188),
        (-26.597077553, 0, 73.25),
        (-58.875, 0, 0),
        (0, 0, -23.25),
        (58.875, 0, 0),
        (-23.75, 0, 53.25),
        (-20.821067812, 0, 26.178932188),
        (-49.159577553, 0, 23.25),
        (-29.444155106, 0, 53.25),
        (-32.373087294, 0, 26.178932188),
        (49.159577553, 0, 23.25),
    ]]
    fillet(fillet13_edges, radius=FILLET13_R - 0.0001)  # a hair under: the kernel refuses the full size


solid = part.part
